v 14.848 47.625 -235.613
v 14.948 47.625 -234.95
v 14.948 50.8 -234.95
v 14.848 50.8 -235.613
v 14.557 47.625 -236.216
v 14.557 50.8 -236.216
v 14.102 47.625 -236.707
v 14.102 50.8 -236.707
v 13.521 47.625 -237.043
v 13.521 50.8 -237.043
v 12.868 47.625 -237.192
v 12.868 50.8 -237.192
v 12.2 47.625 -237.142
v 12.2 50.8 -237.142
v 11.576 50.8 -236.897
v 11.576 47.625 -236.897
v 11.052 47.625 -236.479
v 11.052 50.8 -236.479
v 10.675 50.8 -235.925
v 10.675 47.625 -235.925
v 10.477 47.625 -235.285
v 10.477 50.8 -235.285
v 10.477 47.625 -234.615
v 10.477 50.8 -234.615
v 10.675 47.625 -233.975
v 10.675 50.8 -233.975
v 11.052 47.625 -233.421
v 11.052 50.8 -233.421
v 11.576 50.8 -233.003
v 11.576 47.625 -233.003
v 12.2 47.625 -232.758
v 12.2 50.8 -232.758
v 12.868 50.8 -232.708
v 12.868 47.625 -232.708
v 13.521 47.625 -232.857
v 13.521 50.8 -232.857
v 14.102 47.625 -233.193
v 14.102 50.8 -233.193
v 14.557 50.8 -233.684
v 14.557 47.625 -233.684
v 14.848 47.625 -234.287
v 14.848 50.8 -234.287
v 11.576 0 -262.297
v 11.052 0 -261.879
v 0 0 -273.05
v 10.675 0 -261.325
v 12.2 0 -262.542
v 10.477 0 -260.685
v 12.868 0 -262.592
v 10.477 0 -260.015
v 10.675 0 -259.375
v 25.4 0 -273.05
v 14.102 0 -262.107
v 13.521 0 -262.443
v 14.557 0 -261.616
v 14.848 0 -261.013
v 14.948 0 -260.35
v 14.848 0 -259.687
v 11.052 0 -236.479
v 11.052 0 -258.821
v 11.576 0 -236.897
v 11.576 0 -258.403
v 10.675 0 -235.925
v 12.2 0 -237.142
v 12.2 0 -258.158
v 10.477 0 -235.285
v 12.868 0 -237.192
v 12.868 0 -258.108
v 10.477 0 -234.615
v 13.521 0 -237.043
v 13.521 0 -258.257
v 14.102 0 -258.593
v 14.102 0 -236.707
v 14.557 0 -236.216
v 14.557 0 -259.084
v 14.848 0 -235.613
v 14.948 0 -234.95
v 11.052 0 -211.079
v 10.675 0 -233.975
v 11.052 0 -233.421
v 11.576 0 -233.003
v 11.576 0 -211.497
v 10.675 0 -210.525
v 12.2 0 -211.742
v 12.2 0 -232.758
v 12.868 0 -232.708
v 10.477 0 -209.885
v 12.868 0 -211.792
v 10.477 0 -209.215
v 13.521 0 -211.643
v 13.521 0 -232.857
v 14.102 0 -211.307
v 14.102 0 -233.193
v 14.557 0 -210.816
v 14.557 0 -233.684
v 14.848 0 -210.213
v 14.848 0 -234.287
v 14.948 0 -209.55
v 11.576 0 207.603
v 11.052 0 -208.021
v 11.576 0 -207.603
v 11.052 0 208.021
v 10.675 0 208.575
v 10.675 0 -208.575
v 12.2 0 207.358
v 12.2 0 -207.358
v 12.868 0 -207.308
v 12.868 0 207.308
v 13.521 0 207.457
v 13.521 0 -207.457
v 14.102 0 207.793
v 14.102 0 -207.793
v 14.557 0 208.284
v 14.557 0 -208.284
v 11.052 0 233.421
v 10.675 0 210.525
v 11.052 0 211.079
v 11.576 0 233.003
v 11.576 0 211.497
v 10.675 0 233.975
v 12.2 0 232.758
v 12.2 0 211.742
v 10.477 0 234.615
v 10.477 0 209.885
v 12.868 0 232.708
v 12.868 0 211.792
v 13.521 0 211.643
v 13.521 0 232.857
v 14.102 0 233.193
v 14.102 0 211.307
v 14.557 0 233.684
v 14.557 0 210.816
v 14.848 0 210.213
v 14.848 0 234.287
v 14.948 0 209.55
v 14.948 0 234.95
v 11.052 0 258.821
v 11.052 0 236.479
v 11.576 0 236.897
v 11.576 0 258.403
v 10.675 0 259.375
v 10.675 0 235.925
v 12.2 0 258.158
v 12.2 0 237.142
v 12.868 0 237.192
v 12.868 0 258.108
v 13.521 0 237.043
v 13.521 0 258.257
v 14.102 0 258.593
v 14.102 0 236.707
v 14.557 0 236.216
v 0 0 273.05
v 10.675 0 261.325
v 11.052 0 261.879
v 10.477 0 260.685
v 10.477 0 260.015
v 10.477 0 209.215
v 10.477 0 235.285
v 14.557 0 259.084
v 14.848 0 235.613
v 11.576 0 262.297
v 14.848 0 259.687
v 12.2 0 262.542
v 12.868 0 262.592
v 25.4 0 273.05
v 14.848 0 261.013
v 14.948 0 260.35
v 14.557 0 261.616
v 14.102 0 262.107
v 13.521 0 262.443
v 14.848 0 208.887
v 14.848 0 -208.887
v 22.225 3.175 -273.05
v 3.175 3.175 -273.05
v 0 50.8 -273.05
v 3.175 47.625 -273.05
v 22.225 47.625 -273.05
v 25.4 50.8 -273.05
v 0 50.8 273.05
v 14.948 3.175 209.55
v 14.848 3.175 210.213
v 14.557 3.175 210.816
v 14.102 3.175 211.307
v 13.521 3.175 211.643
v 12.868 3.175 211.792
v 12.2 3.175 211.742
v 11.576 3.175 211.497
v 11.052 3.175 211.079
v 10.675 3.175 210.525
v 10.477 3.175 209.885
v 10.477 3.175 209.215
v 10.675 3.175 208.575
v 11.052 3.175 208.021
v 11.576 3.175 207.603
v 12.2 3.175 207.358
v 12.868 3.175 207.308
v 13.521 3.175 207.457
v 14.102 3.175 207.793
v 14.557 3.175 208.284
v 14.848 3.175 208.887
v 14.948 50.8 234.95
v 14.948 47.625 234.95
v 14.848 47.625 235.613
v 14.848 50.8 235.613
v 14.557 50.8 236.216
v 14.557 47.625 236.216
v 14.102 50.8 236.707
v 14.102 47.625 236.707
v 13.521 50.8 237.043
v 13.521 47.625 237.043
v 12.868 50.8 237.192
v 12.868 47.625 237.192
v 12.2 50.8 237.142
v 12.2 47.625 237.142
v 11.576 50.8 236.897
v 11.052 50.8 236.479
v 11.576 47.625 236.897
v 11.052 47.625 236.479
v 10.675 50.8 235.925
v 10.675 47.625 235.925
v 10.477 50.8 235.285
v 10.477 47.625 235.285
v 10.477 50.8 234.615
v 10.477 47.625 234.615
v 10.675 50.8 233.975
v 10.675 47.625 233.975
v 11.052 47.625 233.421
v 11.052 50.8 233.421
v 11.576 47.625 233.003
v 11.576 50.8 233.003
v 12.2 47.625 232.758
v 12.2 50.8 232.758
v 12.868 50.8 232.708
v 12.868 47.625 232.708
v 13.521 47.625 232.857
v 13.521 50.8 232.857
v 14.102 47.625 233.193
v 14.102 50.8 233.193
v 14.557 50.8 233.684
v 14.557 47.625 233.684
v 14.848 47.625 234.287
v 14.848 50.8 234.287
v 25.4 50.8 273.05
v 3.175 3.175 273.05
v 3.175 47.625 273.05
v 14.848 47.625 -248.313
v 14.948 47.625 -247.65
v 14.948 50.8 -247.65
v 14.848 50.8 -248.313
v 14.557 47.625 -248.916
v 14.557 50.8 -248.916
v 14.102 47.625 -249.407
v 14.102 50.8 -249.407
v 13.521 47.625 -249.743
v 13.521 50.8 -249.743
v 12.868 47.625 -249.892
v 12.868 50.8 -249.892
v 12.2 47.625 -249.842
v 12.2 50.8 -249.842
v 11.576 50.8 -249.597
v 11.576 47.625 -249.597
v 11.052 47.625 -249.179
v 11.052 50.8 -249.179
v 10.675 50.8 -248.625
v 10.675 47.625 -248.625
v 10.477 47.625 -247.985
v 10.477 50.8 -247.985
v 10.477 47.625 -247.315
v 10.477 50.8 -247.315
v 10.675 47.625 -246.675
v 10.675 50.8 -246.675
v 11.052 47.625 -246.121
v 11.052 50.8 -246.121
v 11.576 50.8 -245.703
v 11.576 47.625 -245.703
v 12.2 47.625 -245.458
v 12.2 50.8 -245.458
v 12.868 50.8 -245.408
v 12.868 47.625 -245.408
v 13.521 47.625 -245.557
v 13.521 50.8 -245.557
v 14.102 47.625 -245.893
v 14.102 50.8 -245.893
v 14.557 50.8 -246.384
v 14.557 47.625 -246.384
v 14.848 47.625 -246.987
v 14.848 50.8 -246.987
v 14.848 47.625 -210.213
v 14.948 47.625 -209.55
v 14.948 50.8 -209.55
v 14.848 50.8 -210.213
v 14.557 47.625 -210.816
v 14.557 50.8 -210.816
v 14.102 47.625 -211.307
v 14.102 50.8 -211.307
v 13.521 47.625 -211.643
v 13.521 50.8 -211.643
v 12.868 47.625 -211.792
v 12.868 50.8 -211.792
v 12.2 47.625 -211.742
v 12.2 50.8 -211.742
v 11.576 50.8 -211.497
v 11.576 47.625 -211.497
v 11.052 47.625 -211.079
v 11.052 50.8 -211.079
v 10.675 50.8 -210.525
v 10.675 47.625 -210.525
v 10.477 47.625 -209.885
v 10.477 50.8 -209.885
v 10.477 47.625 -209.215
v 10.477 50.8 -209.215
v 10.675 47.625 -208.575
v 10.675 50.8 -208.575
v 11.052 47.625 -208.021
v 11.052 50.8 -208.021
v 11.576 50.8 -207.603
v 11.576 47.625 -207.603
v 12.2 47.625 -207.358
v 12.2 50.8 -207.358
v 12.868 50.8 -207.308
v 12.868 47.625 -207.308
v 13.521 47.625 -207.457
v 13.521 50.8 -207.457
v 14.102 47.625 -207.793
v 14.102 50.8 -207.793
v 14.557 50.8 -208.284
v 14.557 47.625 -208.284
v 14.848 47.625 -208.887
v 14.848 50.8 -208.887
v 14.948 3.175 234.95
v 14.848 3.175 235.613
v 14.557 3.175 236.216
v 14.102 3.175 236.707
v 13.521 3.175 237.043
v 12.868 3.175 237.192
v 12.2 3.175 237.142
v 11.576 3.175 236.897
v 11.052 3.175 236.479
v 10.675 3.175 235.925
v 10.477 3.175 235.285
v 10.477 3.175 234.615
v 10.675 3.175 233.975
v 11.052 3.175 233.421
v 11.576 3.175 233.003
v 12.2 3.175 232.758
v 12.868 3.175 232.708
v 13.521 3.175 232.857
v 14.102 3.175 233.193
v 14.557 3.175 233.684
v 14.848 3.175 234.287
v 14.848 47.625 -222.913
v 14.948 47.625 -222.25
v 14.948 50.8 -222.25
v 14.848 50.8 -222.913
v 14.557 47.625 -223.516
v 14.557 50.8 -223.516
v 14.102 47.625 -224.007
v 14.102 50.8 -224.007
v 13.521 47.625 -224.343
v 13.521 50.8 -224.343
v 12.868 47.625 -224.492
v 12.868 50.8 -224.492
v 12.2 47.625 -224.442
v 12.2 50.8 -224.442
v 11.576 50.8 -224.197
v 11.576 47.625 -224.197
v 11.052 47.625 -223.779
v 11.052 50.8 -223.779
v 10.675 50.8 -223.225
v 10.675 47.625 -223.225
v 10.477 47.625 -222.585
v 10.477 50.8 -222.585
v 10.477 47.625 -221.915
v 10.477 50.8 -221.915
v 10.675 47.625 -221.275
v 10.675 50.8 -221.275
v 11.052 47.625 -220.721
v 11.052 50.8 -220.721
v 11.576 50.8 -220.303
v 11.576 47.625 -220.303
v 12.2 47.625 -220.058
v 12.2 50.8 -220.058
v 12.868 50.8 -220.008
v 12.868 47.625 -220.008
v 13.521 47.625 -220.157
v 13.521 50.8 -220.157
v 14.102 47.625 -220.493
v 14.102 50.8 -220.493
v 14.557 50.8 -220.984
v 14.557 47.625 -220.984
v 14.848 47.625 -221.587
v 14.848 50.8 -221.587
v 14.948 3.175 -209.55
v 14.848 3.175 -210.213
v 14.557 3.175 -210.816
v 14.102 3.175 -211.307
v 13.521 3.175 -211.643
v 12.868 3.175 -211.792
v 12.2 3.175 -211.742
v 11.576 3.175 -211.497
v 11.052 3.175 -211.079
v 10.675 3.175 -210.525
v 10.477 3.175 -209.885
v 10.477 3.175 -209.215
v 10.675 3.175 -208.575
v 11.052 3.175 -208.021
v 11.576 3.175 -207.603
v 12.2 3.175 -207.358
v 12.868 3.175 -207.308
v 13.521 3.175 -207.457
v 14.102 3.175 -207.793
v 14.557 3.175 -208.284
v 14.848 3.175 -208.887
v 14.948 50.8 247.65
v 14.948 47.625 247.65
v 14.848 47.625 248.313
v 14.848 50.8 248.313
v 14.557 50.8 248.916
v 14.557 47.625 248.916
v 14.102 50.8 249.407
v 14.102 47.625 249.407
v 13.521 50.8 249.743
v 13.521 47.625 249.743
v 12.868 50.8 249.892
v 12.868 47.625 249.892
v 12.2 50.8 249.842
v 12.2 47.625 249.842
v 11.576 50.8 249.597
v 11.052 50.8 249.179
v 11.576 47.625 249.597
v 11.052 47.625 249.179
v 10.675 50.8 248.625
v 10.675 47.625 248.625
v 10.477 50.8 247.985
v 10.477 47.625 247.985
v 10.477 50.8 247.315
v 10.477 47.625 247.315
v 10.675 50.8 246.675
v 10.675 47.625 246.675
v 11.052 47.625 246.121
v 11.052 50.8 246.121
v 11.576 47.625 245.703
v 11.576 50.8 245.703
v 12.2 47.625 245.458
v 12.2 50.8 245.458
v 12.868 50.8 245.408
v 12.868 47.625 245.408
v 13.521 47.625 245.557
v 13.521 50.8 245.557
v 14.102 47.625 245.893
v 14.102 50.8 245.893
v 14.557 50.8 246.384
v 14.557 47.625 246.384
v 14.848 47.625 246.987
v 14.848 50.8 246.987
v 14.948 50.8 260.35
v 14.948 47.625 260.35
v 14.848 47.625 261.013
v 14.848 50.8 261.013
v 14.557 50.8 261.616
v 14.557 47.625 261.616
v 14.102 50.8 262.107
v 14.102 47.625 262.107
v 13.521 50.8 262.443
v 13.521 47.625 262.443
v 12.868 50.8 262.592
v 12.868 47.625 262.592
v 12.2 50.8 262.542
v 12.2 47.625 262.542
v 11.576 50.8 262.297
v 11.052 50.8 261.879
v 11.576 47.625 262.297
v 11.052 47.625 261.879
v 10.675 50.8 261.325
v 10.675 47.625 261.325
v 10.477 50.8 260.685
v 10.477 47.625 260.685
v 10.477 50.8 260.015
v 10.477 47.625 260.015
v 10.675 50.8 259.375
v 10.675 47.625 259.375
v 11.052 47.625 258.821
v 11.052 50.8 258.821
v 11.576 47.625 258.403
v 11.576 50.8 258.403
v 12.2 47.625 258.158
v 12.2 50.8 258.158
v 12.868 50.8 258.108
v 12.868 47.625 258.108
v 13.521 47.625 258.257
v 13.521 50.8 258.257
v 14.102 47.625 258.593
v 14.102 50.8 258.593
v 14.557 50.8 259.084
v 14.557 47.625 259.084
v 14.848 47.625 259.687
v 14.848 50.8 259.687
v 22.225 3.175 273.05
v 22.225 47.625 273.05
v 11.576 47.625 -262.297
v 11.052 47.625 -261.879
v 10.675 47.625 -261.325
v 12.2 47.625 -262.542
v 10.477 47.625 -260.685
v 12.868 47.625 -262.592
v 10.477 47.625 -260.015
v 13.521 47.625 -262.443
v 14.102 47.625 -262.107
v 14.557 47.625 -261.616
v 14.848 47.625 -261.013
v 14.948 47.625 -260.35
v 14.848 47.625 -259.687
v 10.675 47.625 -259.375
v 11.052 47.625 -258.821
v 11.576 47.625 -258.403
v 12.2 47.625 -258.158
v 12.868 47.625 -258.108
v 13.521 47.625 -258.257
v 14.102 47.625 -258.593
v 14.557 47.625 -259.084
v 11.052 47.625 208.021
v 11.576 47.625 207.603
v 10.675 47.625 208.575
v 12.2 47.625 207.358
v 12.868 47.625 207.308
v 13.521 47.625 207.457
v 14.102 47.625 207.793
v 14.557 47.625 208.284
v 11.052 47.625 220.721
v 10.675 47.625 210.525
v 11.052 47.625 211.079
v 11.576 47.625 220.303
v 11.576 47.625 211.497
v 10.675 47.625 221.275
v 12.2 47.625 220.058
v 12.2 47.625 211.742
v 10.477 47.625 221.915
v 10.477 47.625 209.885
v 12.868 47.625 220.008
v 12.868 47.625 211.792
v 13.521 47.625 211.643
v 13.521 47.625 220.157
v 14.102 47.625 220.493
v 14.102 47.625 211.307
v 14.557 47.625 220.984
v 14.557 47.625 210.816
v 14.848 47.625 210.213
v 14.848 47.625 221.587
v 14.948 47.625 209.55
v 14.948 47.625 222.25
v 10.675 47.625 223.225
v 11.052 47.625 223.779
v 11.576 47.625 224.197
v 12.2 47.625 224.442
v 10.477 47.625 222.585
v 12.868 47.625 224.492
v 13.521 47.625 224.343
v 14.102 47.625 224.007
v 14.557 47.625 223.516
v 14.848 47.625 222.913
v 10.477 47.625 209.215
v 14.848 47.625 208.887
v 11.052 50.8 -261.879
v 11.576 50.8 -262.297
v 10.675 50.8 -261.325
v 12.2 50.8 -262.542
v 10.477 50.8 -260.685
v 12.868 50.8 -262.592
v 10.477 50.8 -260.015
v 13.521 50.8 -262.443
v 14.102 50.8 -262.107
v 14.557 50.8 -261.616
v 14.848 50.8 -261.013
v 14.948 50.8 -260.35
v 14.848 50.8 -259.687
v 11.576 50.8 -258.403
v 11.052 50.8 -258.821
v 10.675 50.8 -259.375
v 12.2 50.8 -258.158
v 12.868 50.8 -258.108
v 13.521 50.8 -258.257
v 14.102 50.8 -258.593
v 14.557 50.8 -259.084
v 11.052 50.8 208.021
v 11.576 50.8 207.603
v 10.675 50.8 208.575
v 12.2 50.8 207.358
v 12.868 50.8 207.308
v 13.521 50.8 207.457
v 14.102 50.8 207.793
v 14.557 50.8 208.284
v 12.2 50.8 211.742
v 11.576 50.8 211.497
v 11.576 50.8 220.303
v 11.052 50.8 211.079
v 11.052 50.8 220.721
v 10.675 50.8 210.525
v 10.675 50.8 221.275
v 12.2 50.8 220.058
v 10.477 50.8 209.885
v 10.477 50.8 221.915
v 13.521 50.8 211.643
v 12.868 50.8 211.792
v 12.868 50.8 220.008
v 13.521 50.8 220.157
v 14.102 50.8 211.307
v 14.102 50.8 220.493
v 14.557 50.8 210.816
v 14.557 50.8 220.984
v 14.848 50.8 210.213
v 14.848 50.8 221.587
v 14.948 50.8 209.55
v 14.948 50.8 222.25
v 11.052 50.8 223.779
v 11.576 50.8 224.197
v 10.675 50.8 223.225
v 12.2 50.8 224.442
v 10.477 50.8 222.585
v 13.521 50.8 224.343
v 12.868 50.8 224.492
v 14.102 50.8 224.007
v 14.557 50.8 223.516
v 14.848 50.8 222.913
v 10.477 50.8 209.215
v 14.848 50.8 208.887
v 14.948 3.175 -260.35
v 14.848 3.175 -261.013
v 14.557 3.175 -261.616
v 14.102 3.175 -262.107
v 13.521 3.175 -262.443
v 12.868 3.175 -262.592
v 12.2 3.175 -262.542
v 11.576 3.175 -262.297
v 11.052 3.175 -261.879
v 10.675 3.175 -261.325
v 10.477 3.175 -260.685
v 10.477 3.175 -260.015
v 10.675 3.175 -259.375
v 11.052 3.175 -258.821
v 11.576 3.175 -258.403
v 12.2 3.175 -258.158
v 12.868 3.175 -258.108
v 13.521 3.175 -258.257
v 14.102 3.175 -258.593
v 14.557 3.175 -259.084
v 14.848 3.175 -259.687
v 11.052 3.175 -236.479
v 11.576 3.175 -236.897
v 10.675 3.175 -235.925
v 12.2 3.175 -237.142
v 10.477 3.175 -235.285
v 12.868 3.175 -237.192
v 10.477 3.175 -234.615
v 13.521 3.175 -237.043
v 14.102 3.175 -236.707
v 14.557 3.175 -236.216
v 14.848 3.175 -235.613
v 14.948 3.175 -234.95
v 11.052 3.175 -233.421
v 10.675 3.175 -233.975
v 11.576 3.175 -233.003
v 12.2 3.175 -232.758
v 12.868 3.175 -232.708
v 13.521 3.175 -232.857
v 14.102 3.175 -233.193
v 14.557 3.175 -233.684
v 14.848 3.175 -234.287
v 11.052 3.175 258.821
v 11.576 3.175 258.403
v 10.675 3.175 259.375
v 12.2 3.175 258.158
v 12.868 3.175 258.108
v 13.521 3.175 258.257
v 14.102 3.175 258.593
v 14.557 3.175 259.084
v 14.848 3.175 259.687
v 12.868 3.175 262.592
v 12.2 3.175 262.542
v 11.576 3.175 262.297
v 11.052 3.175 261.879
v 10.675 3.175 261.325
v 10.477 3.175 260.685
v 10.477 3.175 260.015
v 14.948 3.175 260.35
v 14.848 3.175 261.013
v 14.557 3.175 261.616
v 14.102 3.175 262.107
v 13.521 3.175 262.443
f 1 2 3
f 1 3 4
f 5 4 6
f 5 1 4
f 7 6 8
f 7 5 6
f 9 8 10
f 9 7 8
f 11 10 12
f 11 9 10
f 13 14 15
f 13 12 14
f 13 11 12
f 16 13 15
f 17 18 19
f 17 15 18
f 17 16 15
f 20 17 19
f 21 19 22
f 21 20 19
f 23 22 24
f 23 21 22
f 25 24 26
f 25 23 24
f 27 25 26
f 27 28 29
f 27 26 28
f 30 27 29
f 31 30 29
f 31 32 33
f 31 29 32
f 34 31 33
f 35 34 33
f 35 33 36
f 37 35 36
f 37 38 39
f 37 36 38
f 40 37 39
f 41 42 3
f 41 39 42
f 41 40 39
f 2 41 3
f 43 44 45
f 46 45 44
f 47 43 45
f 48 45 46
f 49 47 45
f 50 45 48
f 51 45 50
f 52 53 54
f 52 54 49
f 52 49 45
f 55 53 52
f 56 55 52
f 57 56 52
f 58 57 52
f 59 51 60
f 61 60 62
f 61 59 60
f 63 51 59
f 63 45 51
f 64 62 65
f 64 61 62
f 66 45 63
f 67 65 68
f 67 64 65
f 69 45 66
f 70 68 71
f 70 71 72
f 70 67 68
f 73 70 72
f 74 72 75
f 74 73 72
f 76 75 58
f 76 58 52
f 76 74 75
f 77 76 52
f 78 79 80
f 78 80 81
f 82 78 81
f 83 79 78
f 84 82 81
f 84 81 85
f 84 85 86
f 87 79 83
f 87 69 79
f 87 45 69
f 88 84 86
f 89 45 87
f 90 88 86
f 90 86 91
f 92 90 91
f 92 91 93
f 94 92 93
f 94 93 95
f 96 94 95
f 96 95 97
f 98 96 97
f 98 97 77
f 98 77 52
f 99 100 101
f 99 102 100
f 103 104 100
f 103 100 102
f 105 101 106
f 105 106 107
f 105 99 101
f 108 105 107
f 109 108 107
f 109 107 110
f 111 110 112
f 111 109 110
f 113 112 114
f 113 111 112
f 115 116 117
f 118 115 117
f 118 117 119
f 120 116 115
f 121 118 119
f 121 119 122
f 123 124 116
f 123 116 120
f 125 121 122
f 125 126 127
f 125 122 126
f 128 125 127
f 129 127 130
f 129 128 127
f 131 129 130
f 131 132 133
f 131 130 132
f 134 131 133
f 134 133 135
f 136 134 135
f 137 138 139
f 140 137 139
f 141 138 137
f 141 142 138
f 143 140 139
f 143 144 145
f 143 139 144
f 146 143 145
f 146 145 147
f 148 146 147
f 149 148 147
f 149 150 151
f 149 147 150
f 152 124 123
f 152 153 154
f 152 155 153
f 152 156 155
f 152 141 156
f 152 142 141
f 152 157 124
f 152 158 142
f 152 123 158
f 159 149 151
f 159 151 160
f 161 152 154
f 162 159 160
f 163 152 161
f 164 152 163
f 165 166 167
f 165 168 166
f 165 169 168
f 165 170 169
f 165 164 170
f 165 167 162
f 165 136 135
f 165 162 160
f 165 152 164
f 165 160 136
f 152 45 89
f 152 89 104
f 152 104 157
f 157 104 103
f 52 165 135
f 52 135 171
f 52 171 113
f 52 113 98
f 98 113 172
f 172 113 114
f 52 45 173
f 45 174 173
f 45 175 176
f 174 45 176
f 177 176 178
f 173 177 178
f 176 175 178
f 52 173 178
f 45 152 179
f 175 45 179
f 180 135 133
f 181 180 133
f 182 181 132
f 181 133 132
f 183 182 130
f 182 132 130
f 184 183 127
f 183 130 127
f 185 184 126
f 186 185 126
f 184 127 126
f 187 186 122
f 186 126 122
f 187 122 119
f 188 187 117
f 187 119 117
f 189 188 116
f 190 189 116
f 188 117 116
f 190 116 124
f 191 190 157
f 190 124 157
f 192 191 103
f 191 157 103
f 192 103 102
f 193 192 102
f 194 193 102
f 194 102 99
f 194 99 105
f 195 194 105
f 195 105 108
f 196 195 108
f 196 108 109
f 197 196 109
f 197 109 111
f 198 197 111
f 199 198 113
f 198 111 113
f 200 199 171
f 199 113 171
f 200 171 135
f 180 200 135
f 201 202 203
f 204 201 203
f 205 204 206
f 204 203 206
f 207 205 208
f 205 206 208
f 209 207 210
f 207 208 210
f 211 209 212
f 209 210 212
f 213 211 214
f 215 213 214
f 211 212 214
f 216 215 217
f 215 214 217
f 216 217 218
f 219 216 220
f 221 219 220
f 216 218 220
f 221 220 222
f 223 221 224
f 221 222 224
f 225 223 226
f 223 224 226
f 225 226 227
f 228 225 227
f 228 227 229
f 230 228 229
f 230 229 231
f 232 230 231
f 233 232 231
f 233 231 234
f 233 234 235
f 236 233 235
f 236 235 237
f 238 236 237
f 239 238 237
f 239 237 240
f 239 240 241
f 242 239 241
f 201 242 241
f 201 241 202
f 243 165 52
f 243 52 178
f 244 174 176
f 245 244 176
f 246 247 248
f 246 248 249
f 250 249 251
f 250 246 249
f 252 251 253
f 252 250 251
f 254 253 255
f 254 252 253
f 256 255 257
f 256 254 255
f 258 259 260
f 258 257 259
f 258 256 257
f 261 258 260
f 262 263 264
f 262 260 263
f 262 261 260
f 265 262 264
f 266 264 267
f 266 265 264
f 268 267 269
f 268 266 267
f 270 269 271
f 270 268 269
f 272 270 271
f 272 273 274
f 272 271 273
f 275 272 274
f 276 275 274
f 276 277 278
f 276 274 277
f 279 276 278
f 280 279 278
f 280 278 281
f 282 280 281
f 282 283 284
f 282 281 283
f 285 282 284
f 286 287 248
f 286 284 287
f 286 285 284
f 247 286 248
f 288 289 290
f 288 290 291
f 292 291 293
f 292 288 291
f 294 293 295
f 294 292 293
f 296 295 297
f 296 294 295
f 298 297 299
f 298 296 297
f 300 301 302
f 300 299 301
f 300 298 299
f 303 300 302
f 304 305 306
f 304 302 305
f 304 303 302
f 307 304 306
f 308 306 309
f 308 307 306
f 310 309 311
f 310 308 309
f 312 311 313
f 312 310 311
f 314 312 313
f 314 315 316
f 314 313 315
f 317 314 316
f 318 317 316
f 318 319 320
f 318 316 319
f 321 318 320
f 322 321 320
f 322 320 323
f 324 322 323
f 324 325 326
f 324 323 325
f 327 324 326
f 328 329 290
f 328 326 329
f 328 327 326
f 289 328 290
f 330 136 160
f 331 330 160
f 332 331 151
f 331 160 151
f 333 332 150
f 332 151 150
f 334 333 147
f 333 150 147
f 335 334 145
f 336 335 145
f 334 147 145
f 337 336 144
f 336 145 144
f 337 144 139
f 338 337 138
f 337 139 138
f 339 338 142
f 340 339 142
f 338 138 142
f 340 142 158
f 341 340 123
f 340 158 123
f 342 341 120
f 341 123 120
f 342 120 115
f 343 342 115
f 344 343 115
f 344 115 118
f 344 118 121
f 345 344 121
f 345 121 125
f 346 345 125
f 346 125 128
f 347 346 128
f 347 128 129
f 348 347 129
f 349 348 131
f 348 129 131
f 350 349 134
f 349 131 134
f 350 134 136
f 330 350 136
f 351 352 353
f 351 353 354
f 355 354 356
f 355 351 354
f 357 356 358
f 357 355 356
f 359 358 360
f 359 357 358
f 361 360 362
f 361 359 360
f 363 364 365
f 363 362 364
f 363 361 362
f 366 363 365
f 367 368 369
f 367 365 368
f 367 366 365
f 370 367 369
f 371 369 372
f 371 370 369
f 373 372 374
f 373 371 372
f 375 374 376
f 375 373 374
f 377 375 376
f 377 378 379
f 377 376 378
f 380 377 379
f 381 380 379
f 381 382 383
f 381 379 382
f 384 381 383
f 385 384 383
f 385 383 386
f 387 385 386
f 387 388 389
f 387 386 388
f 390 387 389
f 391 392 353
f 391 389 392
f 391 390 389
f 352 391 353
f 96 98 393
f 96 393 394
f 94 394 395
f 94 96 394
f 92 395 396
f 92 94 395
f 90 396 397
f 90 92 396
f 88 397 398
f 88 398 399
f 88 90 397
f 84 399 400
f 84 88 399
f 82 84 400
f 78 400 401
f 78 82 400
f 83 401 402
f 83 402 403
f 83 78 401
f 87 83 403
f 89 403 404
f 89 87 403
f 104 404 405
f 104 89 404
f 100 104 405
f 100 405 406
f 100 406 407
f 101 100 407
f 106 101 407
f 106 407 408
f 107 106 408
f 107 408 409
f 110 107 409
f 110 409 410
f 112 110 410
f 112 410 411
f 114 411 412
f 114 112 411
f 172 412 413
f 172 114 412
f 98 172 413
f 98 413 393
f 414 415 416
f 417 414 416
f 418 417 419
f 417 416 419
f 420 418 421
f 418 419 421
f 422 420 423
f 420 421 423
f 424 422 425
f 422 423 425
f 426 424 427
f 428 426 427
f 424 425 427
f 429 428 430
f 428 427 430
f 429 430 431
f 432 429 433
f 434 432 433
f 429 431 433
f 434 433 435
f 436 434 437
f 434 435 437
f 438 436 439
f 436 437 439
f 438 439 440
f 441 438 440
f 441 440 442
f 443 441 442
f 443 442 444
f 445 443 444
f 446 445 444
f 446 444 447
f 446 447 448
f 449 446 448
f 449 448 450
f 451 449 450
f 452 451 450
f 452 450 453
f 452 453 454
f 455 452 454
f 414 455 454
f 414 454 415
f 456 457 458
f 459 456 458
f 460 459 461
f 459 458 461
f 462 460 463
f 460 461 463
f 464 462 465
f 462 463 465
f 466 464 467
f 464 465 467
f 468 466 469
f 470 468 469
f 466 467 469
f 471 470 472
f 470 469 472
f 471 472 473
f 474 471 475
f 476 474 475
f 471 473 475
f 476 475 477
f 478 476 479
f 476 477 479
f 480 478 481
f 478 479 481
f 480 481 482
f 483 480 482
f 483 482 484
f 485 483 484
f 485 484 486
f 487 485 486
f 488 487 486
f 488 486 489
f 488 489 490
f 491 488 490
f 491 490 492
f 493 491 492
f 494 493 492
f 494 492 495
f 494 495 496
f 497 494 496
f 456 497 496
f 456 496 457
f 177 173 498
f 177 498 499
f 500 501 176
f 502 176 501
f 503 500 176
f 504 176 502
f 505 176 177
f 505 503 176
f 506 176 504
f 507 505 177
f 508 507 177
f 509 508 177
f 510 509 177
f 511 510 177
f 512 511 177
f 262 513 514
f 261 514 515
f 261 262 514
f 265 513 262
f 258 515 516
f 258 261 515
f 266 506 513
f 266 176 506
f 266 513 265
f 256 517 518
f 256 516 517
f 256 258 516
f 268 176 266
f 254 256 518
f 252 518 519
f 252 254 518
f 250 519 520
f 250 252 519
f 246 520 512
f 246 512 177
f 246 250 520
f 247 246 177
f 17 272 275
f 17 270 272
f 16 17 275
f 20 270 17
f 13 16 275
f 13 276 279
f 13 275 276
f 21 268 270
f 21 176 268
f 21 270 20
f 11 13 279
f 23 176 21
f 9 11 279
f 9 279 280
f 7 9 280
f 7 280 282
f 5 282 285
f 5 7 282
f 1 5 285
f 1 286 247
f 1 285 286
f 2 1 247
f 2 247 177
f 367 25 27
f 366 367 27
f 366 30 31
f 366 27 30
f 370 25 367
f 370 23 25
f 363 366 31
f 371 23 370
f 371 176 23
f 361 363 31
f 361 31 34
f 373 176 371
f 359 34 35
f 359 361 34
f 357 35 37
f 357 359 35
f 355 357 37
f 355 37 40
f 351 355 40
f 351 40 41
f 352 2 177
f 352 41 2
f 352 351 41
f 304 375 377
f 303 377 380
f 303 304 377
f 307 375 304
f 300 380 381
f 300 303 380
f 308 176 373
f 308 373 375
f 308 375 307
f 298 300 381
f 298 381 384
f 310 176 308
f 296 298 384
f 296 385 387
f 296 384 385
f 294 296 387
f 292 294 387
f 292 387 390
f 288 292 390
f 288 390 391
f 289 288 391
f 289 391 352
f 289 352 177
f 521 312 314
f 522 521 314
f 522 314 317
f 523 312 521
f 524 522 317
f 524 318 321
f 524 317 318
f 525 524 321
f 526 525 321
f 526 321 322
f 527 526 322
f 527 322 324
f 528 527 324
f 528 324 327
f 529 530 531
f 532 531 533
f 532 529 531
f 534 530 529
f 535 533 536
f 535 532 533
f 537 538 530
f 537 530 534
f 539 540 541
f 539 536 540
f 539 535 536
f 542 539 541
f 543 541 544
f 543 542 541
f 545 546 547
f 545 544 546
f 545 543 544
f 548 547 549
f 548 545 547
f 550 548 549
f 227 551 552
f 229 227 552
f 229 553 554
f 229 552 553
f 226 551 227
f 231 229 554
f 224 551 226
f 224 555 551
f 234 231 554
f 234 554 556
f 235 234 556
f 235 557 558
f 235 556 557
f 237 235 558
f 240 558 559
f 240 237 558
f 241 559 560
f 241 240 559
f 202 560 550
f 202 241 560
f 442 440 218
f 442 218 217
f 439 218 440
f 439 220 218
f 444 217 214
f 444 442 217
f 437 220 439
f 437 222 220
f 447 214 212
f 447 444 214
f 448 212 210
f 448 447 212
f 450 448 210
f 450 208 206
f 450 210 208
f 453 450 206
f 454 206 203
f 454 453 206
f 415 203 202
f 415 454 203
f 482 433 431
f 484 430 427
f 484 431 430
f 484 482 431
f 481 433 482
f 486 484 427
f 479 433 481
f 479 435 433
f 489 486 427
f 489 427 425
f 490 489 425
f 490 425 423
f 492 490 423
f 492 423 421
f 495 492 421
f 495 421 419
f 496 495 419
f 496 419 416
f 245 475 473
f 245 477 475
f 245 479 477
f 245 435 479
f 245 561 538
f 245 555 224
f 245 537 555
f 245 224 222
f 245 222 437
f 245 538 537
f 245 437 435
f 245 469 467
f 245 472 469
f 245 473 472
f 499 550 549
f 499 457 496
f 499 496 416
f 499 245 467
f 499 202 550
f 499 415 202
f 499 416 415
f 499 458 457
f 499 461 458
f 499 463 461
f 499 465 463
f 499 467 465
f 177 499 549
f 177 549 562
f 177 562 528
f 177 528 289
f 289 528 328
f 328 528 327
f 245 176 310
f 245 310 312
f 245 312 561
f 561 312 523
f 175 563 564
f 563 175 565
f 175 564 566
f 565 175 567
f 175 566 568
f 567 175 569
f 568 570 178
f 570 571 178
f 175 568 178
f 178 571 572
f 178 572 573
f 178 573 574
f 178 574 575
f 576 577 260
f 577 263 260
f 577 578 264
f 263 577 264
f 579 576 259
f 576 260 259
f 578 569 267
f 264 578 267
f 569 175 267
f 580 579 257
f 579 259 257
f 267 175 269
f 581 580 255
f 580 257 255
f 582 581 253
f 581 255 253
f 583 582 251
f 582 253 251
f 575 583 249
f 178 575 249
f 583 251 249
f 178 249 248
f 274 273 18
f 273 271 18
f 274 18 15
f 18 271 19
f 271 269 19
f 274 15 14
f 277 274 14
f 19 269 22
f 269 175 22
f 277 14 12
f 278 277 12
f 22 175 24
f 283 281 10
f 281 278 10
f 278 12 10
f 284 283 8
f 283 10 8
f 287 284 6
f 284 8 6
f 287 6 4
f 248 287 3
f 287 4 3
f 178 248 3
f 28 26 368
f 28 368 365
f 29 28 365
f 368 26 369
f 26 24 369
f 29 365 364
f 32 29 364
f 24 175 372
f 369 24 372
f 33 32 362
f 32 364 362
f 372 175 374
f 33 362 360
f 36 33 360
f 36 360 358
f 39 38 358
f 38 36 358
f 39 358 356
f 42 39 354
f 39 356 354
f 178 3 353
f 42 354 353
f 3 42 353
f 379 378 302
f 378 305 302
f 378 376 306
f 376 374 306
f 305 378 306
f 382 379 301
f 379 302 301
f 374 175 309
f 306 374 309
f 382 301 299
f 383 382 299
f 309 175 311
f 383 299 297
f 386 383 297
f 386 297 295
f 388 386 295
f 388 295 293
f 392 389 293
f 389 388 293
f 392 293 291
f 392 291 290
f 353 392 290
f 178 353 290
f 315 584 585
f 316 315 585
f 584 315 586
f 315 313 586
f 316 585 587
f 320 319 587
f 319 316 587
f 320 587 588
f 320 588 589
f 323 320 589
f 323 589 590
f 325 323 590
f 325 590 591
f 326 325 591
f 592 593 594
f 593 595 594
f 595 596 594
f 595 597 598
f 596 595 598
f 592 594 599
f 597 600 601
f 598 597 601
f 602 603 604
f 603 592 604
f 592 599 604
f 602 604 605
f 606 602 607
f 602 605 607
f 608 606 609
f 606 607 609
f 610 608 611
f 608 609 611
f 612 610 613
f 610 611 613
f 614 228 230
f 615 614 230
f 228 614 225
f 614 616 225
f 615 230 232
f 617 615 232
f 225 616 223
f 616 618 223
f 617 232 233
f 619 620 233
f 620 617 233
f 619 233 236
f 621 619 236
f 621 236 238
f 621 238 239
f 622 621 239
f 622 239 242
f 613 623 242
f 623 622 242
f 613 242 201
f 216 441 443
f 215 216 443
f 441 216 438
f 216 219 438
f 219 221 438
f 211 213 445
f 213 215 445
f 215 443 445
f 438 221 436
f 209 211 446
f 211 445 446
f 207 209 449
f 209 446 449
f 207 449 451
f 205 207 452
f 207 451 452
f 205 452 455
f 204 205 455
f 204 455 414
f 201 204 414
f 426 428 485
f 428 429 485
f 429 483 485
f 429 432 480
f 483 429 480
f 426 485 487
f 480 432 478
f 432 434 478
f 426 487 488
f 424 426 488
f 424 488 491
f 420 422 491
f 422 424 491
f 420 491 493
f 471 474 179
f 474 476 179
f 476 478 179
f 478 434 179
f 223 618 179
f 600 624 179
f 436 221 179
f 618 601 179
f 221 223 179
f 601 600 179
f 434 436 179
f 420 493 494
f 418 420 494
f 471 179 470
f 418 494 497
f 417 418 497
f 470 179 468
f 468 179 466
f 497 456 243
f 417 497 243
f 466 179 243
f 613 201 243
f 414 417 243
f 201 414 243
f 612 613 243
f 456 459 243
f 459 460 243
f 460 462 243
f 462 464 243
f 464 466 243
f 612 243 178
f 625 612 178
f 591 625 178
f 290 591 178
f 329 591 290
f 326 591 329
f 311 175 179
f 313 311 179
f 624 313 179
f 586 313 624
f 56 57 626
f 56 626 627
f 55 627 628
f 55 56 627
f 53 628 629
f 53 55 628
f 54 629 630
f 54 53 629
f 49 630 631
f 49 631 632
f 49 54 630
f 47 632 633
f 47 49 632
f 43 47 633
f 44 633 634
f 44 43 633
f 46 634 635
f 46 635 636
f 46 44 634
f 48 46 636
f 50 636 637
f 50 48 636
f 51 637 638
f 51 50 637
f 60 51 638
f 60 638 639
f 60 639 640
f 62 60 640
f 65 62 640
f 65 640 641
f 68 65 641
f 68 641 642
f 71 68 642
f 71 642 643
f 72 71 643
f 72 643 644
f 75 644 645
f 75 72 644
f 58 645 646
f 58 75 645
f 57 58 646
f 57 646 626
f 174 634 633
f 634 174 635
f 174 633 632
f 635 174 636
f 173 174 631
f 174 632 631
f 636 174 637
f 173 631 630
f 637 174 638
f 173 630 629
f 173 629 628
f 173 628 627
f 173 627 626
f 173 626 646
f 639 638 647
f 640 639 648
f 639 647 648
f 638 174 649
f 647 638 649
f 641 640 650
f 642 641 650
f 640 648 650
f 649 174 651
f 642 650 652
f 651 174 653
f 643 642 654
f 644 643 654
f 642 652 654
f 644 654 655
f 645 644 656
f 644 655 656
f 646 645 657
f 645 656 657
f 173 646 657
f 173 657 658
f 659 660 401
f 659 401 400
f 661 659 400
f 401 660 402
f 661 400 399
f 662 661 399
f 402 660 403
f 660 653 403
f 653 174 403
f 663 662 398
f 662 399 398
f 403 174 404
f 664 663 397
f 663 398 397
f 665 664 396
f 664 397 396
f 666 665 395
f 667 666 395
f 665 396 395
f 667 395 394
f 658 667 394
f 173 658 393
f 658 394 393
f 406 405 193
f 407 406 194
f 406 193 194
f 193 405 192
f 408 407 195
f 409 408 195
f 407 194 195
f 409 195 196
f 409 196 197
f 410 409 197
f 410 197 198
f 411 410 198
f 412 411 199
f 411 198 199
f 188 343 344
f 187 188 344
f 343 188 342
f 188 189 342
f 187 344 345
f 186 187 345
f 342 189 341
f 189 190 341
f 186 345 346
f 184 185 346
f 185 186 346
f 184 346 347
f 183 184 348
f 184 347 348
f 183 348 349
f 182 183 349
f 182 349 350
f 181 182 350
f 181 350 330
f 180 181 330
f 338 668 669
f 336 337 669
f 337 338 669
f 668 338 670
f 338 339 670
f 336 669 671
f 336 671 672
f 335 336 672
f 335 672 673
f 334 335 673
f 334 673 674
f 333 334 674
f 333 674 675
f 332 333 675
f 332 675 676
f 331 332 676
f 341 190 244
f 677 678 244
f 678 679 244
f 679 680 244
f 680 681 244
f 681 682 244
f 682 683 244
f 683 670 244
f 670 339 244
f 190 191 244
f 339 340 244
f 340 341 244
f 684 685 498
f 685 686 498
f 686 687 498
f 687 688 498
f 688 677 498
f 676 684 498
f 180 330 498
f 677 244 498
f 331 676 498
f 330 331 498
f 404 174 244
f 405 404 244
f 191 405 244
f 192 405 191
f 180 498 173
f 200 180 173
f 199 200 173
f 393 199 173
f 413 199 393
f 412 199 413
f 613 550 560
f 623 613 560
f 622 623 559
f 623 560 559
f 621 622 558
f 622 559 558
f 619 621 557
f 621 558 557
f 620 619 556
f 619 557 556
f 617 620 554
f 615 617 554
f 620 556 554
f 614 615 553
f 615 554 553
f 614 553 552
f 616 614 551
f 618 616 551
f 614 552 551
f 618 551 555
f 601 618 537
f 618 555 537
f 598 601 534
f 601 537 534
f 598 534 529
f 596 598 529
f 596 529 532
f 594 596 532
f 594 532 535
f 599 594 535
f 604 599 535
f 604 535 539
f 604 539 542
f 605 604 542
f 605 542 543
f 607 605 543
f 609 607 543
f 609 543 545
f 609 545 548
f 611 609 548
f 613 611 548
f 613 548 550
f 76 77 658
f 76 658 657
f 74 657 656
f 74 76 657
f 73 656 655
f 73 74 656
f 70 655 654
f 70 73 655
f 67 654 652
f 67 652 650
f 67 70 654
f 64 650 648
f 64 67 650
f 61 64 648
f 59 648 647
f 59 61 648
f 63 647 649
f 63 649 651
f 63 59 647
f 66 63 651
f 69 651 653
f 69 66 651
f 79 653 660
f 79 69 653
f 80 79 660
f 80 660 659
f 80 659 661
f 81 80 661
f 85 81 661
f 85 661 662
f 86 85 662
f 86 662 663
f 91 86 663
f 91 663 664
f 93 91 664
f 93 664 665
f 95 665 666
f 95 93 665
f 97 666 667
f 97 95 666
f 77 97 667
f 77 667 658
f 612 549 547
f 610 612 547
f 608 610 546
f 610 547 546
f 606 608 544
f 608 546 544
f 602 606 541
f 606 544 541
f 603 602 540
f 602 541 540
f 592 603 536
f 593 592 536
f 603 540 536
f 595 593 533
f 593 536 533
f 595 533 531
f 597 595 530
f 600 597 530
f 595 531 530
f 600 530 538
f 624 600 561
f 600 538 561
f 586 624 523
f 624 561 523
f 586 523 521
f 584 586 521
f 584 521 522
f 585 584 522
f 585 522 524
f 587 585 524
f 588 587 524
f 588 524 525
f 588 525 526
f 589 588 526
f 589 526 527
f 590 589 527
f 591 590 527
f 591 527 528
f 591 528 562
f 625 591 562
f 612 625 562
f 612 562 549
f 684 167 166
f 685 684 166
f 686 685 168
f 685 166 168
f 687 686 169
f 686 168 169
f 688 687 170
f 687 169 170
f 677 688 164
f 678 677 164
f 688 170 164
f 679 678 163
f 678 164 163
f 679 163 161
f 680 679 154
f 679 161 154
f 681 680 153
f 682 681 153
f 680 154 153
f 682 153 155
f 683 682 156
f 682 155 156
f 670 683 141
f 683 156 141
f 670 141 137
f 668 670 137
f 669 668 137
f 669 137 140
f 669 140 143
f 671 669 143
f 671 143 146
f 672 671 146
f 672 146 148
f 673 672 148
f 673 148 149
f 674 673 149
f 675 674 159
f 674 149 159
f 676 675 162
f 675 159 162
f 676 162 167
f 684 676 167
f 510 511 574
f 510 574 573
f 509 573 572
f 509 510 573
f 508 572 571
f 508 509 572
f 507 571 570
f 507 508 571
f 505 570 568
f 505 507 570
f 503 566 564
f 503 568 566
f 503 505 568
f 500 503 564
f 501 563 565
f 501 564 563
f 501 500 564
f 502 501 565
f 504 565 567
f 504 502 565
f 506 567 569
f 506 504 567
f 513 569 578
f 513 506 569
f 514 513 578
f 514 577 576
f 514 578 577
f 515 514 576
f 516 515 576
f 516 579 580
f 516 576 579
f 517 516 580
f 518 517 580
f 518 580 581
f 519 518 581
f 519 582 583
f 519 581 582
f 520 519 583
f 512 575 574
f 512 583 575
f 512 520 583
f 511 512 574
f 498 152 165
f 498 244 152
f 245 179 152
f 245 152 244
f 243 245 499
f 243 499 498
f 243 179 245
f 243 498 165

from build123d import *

# Parameters (mm, degrees)
SKETCH1_W           = 25.4
SKETCH1_H           = 50.8
SKETCH1_W_2         = 19.05
SKETCH1_H_2         = 44.45
BOSS_EXTRUDE1_DEPTH = 273.05
SKETCH2_R           = 2.2479
CUT_EXTRUDE5_DEPTH  = 3.175
CUT_EXTRUDE9_START  = 3.175
SKETCH2_5_R         = 2.2479
CUT_EXTRUDE9_DEPTH  = 48.625


with BuildPart() as part:
    # Sketch1 → Boss-Extrude1 (new body, symmetric)
    with BuildSketch(Plane.XY):
        with Locations((12.7, 25.4)):
            Rectangle(SKETCH1_W, SKETCH1_H)
        with Locations((12.7, 25.4)):
            Rectangle(SKETCH1_W_2, SKETCH1_H_2, mode=Mode.SUBTRACT)
    extrude(amount=BOSS_EXTRUDE1_DEPTH, both=True)

    # Sketch2 → Cut-Extrude5 (cut)
    with BuildSketch(Plane(origin=(0, 0, 0), x_dir=(1, 0, 0), z_dir=(0, 1, 0))):
        with Locations((12.7, 260.35)):
            Circle(SKETCH2_R)
        with Locations((12.7, 234.95)):
            Circle(SKETCH2_R)
        with Locations((12.7, 209.55)):
            Circle(SKETCH2_R)
    cut_extrude5 = extrude(amount=CUT_EXTRUDE5_DEPTH, mode=Mode.SUBTRACT)

    # Sketch2<5> → Cut-Extrude9 (cut, through all)
    with BuildSketch(Plane(origin=(0, 0, 0), x_dir=(1, 0, 0), z_dir=(0, 1, 0)).offset(CUT_EXTRUDE9_START)):
        with Locations((12.7, 260.35)):
            Circle(SKETCH2_5_R)
        with Locations((12.7, 247.65)):
            Circle(SKETCH2_5_R)
        with Locations((12.7, 234.95)):
            Circle(SKETCH2_5_R)
        with Locations((12.7, 222.25)):
            Circle(SKETCH2_5_R)
        with Locations((12.7, 209.55)):
            Circle(SKETCH2_5_R)
    cut_extrude9 = extrude(amount=CUT_EXTRUDE9_DEPTH, mode=Mode.SUBTRACT)

    # Mirror3: Cut-Extrude5, Cut-Extrude9 across plane
    add(cut_extrude5.mirror(Plane.XY), mode=Mode.SUBTRACT)
    add(cut_extrude9.mirror(Plane.XY), mode=Mode.SUBTRACT)


solid = part.part
